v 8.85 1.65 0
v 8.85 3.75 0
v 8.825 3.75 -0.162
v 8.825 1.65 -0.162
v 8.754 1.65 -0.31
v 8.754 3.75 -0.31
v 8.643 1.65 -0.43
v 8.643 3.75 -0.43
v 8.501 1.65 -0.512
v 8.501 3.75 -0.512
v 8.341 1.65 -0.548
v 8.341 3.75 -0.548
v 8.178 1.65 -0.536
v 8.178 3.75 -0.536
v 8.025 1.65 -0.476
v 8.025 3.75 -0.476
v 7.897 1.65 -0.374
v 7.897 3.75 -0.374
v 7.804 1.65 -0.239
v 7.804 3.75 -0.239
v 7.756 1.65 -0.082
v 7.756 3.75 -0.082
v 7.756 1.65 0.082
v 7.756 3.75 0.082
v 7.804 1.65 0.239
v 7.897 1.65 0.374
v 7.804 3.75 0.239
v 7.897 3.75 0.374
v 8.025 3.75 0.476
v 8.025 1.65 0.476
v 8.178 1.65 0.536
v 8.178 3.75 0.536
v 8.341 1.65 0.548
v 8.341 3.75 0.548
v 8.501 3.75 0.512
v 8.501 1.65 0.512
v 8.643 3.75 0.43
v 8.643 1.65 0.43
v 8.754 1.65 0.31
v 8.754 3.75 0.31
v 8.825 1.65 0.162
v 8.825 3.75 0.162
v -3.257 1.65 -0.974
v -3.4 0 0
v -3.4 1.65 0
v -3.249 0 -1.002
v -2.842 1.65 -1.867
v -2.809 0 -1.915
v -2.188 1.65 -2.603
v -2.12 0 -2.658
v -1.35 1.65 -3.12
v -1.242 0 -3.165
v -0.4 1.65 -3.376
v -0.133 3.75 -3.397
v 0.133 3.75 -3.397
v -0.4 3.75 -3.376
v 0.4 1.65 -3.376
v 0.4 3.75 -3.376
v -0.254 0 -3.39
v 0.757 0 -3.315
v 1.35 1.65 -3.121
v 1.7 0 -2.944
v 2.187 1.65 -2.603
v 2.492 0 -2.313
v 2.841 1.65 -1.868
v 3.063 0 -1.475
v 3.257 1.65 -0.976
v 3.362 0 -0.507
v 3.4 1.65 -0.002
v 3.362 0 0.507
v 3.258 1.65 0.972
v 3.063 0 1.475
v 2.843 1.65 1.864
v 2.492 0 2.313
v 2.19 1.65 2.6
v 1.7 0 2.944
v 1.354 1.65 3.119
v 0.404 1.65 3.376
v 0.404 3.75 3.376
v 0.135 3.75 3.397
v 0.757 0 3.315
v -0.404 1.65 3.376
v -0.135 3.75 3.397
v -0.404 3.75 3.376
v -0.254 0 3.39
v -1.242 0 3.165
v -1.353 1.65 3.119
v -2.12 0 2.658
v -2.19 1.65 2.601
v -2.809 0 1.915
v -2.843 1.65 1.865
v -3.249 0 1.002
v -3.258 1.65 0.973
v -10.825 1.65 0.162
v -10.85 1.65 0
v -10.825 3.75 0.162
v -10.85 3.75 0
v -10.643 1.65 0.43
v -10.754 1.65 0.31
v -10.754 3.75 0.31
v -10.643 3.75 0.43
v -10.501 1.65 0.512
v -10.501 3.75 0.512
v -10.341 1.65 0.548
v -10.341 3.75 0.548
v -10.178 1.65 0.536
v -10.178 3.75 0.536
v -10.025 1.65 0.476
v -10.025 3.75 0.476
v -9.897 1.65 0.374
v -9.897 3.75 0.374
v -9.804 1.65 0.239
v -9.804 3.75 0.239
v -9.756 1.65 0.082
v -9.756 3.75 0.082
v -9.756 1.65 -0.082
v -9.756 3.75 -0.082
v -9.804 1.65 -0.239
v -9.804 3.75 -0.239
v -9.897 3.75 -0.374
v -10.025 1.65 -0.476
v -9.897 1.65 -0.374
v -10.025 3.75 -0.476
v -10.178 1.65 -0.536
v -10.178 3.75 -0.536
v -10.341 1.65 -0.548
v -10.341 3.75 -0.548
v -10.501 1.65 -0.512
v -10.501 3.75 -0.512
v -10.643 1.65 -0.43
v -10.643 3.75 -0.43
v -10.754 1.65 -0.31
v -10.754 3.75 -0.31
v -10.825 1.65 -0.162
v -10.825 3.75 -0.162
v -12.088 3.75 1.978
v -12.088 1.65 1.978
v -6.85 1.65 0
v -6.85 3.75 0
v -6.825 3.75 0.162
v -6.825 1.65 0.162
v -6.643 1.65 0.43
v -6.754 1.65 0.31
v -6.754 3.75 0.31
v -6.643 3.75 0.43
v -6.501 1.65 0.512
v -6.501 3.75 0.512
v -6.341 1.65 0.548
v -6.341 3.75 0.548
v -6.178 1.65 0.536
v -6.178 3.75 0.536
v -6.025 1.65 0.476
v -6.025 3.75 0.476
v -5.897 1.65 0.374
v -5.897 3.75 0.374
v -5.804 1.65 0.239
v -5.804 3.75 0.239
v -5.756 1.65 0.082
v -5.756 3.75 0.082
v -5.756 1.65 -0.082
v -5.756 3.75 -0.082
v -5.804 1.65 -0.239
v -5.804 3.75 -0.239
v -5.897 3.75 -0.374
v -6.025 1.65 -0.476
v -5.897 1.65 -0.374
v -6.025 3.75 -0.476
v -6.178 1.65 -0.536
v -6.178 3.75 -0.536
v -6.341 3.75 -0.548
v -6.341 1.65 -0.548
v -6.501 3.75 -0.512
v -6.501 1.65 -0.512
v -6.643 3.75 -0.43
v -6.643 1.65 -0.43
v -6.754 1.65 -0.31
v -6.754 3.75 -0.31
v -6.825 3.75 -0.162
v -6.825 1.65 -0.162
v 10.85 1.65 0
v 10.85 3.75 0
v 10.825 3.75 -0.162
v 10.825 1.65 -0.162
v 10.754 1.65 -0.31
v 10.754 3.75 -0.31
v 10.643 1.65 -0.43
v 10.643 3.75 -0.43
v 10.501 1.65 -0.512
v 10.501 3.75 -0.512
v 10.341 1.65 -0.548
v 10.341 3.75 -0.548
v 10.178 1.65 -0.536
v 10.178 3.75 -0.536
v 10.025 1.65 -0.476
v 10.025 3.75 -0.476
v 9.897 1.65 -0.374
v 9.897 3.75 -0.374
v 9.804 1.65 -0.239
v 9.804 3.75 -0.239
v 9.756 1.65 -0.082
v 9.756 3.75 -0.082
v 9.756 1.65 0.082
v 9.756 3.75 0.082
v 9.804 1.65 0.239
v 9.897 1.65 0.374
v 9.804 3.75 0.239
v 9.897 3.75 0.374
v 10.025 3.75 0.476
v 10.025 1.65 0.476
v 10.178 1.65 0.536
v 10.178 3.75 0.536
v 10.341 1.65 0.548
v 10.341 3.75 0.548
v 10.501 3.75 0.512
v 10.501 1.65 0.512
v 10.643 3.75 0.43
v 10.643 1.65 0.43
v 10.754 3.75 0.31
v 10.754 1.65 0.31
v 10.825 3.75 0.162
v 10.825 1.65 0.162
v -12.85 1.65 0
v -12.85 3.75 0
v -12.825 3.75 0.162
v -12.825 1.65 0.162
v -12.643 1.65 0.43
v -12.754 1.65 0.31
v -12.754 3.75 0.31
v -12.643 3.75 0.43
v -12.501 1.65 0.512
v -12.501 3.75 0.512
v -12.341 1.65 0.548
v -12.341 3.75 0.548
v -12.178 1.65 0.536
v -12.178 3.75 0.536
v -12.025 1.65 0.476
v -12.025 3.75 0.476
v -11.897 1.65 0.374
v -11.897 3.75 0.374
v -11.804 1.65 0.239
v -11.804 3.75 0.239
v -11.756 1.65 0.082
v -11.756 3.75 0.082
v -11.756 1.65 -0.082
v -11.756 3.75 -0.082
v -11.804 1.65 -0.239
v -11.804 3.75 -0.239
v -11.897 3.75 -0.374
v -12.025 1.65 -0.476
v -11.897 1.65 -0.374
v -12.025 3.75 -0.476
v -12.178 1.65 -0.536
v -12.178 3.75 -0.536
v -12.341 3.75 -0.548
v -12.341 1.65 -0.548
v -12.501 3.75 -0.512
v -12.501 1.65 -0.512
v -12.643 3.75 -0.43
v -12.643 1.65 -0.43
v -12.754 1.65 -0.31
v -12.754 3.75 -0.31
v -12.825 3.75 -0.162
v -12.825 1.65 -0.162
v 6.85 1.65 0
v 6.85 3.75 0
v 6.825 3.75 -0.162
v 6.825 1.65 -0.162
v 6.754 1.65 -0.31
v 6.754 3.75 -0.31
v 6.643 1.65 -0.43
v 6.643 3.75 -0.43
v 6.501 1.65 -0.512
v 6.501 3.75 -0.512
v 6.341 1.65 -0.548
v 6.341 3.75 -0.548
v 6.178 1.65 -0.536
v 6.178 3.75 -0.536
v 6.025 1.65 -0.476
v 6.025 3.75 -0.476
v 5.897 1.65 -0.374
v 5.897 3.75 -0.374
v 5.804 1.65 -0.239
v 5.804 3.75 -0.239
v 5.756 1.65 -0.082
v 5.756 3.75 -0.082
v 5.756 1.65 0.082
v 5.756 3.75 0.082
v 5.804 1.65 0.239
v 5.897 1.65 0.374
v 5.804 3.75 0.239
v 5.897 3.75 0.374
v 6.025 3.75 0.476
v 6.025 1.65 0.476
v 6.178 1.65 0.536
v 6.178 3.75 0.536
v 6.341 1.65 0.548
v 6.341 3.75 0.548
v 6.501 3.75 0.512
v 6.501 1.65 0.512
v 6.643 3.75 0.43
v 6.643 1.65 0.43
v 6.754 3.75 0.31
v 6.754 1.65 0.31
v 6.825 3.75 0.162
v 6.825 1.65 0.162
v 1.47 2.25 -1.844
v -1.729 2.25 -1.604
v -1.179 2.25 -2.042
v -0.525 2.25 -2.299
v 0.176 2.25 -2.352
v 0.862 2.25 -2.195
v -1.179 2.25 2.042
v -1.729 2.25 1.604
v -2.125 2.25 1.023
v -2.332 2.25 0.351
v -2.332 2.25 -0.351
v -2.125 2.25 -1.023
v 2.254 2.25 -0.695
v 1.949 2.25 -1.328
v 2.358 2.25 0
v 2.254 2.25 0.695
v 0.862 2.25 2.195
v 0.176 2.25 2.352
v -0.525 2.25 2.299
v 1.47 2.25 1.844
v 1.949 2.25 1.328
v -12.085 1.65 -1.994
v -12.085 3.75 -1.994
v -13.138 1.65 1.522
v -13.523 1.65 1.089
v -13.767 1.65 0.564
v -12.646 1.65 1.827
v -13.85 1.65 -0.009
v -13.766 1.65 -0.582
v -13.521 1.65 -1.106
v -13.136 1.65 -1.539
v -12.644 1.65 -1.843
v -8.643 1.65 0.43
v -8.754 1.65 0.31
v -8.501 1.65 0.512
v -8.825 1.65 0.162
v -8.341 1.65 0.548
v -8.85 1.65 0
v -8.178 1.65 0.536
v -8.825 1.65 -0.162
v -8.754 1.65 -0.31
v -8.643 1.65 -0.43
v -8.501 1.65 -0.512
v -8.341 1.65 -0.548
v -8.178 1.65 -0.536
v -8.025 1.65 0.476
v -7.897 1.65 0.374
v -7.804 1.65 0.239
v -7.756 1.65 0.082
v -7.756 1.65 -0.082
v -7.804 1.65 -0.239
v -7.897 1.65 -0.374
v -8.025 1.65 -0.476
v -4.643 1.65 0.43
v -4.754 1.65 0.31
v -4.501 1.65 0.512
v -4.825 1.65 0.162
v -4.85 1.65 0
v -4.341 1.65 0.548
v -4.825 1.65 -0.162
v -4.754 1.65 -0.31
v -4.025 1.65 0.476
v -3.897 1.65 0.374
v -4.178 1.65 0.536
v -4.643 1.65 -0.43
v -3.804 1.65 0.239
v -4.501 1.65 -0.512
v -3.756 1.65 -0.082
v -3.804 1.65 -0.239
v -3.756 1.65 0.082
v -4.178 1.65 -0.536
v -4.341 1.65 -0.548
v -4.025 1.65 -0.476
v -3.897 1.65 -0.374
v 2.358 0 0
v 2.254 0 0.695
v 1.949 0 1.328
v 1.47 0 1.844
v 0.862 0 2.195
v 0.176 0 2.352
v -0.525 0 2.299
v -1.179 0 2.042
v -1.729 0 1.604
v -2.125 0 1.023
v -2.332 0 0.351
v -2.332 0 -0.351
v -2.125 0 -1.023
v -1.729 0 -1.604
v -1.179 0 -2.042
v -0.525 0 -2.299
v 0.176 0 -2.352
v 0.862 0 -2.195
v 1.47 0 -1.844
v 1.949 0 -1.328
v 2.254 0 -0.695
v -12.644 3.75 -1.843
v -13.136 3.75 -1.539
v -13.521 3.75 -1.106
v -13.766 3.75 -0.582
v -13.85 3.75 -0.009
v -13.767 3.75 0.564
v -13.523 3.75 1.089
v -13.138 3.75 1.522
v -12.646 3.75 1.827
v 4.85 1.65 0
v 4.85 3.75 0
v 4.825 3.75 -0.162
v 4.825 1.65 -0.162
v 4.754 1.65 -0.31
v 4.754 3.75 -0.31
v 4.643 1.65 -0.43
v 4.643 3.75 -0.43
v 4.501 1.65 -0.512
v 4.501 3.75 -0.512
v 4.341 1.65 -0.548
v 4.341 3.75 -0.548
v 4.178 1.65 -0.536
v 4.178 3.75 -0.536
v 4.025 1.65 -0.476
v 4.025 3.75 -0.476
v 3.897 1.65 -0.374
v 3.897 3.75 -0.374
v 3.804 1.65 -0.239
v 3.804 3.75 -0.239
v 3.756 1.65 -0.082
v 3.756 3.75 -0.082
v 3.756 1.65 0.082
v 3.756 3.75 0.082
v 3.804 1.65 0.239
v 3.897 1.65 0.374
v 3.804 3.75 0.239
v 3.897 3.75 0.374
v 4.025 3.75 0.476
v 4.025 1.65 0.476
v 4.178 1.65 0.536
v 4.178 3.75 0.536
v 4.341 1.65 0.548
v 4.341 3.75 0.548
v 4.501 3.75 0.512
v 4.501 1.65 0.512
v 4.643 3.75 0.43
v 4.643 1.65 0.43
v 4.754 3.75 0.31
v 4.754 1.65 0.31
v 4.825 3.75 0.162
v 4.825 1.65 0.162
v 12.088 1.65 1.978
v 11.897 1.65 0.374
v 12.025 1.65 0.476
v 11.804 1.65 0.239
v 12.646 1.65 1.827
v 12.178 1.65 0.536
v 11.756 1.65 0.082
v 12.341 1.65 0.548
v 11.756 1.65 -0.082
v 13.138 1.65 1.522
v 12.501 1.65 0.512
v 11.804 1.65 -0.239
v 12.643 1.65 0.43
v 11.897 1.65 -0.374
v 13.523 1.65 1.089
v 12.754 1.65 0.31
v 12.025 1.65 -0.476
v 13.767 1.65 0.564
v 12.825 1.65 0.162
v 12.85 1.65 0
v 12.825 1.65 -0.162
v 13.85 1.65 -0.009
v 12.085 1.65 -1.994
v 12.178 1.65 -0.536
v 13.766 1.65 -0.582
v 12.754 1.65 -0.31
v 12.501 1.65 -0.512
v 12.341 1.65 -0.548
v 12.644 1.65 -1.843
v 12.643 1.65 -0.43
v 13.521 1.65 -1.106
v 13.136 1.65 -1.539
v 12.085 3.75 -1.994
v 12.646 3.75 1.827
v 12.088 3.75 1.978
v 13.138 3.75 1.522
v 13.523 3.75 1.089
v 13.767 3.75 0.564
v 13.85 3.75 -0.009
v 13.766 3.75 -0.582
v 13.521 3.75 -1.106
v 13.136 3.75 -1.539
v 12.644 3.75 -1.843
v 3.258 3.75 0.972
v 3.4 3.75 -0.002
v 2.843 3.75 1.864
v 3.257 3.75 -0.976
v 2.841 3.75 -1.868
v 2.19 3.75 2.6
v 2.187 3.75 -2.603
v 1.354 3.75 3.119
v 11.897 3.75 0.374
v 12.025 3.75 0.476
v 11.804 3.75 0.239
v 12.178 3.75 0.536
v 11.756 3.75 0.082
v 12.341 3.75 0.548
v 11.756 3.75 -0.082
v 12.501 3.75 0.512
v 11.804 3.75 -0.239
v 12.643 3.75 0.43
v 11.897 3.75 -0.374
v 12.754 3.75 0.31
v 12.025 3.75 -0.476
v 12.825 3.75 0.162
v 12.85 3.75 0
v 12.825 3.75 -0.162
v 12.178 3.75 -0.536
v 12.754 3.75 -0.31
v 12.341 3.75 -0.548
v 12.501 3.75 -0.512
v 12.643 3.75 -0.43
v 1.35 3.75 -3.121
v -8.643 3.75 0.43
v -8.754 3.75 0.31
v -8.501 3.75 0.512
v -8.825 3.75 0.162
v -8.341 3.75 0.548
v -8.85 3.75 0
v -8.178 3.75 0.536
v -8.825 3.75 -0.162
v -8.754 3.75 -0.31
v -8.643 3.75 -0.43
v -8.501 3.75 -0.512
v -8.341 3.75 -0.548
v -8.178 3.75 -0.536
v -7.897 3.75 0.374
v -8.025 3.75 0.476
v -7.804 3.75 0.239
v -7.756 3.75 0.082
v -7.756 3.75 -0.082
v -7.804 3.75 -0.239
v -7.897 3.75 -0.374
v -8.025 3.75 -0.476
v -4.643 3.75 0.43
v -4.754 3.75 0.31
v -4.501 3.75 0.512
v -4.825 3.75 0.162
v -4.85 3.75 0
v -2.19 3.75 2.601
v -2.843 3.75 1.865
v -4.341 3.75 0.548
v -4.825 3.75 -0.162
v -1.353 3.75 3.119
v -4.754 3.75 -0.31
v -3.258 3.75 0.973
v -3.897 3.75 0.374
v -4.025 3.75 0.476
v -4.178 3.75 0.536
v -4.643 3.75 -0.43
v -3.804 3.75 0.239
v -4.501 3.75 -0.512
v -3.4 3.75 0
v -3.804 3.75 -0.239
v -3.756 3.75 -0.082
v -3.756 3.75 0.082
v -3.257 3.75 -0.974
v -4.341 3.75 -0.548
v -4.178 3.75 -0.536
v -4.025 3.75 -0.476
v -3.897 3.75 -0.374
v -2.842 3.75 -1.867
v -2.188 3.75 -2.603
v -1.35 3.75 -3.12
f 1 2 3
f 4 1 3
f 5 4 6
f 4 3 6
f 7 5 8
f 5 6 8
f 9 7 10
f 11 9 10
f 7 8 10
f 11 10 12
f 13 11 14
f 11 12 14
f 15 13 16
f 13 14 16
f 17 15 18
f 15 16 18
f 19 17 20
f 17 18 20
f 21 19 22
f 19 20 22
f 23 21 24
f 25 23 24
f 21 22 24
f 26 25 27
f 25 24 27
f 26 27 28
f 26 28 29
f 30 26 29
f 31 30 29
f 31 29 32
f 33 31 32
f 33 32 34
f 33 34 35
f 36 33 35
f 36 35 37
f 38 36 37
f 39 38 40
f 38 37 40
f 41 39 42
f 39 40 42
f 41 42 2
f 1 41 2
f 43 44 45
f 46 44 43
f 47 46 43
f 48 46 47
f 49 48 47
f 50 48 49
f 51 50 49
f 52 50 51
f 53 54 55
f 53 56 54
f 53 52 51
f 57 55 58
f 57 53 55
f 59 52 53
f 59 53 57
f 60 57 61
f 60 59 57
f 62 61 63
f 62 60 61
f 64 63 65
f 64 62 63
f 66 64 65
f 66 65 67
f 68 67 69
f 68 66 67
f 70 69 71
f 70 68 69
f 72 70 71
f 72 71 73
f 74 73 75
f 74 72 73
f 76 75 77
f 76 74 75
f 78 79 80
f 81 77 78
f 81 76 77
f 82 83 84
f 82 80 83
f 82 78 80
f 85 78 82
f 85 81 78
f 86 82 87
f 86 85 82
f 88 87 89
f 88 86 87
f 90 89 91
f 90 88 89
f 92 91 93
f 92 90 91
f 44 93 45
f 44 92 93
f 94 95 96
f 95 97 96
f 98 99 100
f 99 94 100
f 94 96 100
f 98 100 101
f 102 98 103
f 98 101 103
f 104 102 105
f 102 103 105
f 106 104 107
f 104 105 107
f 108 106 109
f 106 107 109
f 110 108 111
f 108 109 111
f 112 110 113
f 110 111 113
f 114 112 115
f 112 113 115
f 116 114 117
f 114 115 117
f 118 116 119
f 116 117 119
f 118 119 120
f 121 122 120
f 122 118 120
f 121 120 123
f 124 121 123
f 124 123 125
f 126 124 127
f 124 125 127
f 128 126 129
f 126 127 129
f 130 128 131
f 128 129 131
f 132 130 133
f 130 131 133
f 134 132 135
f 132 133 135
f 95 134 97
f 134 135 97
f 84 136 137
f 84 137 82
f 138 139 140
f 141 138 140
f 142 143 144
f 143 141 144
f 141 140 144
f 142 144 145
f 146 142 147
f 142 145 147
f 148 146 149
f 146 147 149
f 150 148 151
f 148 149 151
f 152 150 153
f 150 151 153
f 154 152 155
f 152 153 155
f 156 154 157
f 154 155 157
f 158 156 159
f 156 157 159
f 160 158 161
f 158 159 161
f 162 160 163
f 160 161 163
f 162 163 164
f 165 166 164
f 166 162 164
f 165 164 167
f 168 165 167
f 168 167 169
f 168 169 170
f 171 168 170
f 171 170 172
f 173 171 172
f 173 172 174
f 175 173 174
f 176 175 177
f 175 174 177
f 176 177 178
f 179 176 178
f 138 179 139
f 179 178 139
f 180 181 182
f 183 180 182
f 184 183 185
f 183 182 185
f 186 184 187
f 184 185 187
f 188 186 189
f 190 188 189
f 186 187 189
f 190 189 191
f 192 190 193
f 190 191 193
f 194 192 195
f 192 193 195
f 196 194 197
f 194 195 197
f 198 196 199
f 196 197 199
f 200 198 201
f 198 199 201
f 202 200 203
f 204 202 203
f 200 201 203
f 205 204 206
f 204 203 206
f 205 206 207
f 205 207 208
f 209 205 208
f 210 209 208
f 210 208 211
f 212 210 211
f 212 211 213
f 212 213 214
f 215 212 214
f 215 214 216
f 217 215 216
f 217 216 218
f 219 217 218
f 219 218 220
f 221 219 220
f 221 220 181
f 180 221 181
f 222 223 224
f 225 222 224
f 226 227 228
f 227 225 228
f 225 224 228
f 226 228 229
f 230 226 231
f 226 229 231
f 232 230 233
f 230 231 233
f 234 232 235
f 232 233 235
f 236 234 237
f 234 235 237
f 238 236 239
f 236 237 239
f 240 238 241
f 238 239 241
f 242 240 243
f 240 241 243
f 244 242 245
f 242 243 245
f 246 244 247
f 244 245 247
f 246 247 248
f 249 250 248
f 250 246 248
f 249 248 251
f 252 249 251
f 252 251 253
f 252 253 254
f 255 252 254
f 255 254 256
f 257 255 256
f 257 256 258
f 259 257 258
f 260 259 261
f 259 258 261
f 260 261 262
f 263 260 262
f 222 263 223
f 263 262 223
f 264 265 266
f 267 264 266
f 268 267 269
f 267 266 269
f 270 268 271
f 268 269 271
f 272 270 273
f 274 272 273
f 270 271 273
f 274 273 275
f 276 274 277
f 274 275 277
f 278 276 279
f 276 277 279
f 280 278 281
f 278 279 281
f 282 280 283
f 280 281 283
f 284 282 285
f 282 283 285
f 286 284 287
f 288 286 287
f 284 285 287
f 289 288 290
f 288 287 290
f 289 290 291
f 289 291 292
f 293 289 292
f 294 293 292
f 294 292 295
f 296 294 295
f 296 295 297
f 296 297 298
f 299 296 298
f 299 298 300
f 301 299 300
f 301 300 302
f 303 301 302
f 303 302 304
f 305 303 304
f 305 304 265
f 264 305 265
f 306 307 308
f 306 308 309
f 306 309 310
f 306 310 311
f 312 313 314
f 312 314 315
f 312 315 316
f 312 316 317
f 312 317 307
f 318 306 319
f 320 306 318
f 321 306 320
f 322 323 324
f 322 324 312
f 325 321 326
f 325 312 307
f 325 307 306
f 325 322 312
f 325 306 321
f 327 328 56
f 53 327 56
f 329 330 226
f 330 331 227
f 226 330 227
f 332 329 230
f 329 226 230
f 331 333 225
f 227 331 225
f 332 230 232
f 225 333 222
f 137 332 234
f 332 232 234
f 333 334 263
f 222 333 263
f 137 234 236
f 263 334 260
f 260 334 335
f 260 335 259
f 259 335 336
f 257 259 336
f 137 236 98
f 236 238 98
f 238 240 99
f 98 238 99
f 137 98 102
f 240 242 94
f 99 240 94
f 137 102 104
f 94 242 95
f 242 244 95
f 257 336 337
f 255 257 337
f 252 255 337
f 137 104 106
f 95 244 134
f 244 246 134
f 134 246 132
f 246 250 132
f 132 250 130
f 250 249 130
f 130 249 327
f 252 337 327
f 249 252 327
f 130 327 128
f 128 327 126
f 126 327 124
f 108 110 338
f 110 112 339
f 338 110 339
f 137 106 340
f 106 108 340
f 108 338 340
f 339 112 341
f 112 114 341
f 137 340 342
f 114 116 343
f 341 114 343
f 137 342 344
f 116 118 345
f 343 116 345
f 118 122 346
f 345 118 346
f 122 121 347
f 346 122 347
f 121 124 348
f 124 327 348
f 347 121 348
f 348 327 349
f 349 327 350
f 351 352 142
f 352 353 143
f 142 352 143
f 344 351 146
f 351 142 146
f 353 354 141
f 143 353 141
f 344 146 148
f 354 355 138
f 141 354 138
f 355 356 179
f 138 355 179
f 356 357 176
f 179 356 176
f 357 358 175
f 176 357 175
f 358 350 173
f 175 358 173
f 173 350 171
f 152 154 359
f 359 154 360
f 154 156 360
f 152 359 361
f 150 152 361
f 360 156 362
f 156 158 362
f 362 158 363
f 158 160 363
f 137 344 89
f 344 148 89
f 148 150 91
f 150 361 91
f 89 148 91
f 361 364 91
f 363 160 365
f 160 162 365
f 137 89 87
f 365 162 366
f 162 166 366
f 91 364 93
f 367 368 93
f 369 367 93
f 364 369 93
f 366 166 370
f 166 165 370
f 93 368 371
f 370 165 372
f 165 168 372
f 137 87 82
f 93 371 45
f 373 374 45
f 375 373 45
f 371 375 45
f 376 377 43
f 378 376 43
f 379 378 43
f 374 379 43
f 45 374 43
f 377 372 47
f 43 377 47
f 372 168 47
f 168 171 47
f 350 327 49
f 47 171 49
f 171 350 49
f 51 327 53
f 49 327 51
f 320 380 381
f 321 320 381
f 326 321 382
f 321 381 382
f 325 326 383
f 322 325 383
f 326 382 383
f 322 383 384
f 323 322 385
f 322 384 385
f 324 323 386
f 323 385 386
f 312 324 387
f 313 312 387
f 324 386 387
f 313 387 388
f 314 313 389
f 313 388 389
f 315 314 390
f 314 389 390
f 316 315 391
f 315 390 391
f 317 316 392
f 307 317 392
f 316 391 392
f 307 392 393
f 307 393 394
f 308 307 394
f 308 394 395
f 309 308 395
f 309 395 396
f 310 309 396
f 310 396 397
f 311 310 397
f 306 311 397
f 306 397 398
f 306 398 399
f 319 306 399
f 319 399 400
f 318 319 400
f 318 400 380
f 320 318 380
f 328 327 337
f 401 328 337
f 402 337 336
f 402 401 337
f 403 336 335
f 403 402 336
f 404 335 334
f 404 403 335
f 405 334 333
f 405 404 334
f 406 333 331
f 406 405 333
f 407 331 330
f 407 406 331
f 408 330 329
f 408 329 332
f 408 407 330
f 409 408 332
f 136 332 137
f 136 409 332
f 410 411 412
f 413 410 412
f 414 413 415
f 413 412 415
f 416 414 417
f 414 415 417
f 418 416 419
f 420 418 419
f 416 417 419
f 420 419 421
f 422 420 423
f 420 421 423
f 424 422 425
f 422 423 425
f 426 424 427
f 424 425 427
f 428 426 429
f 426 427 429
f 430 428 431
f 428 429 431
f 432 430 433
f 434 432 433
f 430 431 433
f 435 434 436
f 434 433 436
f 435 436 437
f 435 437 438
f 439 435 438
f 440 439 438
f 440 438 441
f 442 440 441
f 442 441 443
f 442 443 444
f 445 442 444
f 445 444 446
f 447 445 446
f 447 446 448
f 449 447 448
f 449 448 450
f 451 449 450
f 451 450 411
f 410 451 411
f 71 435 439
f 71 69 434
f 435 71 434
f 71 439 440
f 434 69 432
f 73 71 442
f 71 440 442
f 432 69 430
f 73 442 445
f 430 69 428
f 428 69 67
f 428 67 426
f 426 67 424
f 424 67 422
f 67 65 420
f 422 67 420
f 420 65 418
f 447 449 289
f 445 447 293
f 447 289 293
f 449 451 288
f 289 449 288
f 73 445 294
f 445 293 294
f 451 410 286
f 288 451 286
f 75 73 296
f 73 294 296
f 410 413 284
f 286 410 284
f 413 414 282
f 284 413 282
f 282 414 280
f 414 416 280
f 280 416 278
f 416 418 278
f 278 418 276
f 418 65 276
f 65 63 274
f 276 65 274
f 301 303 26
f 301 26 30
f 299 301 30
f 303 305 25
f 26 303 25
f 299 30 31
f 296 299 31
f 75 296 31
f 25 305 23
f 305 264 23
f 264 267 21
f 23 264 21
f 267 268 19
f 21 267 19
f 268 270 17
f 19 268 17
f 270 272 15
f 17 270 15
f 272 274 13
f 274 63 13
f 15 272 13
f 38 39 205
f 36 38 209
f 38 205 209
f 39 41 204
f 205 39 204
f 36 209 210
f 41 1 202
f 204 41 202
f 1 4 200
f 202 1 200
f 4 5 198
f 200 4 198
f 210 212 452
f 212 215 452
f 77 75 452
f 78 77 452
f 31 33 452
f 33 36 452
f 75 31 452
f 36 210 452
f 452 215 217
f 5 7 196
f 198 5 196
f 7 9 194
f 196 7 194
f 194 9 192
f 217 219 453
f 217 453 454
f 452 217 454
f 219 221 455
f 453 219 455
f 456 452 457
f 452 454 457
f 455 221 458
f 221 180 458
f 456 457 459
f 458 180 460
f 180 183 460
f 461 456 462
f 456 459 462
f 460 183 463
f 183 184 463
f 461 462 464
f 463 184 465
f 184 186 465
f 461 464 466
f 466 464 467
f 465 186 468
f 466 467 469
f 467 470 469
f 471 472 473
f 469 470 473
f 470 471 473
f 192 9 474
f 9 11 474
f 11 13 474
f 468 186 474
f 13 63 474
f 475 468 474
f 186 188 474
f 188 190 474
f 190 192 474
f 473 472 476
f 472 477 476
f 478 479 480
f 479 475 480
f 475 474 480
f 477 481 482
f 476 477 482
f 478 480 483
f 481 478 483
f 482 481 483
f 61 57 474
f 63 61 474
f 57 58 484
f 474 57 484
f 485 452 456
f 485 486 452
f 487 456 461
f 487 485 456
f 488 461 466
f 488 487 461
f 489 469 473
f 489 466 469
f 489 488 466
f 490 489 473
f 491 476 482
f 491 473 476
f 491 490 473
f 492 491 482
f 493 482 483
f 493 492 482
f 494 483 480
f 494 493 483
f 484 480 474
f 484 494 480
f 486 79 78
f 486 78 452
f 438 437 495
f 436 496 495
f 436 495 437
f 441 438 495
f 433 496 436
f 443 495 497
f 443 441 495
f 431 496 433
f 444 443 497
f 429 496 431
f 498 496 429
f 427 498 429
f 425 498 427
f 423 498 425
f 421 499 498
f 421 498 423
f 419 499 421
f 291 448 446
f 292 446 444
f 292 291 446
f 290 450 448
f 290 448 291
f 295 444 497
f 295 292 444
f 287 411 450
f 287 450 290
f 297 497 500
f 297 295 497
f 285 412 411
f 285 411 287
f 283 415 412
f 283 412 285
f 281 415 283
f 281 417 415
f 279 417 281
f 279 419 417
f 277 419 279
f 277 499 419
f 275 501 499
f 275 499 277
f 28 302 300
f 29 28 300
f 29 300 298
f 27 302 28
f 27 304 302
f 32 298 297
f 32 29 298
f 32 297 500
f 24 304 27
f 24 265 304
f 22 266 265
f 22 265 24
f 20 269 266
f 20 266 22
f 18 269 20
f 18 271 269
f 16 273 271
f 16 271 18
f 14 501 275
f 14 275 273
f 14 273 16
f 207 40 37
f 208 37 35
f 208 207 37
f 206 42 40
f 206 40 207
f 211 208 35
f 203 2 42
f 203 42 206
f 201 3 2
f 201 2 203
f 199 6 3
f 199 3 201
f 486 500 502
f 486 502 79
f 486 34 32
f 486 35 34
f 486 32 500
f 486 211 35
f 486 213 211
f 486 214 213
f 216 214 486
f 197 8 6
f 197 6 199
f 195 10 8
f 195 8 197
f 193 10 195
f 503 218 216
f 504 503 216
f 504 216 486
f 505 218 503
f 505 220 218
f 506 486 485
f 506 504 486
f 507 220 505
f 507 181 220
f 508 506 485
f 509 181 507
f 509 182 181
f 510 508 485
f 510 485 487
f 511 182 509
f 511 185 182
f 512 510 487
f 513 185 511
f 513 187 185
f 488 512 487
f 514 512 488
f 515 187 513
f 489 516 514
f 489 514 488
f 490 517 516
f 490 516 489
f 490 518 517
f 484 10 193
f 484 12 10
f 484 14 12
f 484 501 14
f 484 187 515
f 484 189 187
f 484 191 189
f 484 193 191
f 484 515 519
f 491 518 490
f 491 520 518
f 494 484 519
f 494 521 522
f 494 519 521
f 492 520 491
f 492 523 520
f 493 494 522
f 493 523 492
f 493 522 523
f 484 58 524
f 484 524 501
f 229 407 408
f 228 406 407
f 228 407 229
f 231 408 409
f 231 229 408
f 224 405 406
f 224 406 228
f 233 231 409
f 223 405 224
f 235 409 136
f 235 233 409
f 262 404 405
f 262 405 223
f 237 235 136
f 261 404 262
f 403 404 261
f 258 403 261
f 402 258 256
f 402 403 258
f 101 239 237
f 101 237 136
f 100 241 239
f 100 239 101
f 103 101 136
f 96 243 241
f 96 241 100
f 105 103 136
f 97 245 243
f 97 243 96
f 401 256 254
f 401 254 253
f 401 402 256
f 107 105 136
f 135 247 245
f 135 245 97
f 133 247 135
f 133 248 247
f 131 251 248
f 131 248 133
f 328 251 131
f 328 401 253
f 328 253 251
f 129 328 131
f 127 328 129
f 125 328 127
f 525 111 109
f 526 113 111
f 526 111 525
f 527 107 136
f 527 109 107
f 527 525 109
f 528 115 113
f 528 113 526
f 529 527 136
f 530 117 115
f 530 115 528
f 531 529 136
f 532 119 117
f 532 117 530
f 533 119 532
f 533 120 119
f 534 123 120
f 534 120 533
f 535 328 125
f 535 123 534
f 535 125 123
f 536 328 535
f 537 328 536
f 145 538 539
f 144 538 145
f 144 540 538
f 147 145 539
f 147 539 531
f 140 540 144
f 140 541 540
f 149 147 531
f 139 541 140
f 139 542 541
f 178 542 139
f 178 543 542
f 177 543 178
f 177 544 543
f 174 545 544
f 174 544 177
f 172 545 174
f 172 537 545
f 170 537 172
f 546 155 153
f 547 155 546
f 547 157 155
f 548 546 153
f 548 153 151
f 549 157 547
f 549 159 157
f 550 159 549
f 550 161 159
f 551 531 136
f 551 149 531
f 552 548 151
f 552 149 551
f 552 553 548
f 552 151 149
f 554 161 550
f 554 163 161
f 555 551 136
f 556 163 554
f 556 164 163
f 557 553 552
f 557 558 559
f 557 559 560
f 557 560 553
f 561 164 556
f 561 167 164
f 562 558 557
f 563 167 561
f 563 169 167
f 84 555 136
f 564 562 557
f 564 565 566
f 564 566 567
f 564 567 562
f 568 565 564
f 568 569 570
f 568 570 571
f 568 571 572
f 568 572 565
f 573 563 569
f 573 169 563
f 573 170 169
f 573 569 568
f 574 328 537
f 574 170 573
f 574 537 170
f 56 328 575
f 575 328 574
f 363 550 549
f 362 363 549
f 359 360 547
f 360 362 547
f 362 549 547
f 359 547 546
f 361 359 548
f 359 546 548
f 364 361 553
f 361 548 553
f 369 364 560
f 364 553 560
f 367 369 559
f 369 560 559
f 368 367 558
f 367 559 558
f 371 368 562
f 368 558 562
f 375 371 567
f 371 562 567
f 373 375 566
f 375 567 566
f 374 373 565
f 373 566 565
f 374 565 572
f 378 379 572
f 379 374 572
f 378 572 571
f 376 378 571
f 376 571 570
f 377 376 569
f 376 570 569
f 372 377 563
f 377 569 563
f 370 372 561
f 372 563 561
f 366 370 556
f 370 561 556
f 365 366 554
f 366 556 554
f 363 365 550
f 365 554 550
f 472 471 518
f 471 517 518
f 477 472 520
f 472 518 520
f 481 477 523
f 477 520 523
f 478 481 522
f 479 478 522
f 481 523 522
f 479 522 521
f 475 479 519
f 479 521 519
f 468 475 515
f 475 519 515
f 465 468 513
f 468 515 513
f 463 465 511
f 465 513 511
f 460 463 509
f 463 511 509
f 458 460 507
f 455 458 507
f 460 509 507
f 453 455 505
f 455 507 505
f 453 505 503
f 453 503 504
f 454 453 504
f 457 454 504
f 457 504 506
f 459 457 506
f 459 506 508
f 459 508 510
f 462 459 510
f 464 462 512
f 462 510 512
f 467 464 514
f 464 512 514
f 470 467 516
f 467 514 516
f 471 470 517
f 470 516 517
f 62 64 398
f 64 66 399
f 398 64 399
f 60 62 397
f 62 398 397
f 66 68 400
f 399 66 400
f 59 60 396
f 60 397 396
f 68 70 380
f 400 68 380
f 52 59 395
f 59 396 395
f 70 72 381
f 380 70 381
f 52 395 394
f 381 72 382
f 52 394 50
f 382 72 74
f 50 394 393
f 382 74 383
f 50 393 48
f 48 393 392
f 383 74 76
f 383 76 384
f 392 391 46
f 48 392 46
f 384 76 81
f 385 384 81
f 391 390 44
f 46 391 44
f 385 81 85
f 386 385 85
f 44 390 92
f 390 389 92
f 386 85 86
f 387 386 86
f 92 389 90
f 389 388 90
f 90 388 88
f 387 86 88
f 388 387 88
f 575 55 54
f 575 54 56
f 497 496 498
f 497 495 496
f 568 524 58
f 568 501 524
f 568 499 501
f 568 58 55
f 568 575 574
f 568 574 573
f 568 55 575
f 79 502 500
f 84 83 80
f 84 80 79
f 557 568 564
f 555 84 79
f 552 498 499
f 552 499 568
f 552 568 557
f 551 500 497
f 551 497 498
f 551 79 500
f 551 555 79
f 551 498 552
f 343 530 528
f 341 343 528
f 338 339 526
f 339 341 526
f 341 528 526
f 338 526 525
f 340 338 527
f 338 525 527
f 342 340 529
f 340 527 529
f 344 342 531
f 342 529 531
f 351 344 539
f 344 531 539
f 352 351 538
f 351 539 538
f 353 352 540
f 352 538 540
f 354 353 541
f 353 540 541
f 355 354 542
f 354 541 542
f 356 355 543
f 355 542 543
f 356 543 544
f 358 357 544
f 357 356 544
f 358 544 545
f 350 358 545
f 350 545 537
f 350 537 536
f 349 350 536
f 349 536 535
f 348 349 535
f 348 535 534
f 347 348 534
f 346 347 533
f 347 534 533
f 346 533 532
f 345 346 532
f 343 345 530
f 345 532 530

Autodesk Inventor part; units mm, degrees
ref_plane "YZ Plane" through (0, 0, 0) normal (1, 0, 0) x (0, 1, 0)
ref_plane "XZ Plane" through (0, 0, 0) normal (0, 1, 0) x (-1, 0, 0)
ref_plane "XY Plane" through (0, 0, 0) normal (0, 0, 1) x (1, 0, 0)
sketch "Sketch1" plane through (0, 0, 0) normal (0, 1, 0) x (-1, 0, 0)
  circle A0 centre (0, 0) radius 3.4
  dimension "d3" = 6.8
extrude "Extrusion1" add sketch "Sketch1" along normal blind 3.75
sketch "Sketch2" plane through (0, 0, 0) normal (0, -1, 0) x (1, 0, 0)
  circle A0 centre (0, 0) radius 2.3583
extrude "Extrusion2" cut sketch "Sketch2" against normal blind 2.25
sketch "Sketch3" plane through (0, 3.75, 0) normal (0, 1, 0) x (1, 0, 0)
  circle A0 centre (0, 0) radius 3.4 construction
  line L0 (0, -3.4) -> (0, 3.4) construction
  circle A1 centre (-11.85, 0.0077) radius 2
  line L1 (-12.0876, -1.9781) -> (-0.4039, -3.3759)
  line L2 (-12.085, 1.9939) -> (-0.3995, 3.3764)
  circle A2 centre (0, 0) radius 3.4 projected
  dimension "d6" = 4
  dimension "d7" = 11.85
extrude "Extrusion3" add sketch "Sketch3" against normal blind 2.1 contours A1 | A1 L2 A2 L1
mirror "Mirror1" about plane through (0, 0, 0) normal (1, 0, 0) of "Extrusion3"
sketch "Sketch4" plane through (0, 3.75, 0) normal (0, 1, 0) x (1, 0, 0)
  circle A0 centre (12.2999, 0) radius 0.55
  arc A1 (12.0876, -1.9781) -> (12.085, 1.9939) centre (11.85, 0.0077) ccw projected
  line L0 (0, 0) -> (13.85, 0) construction
  circle A2 centre (10.2999, 0) radius 0.55
  circle A3 centre (8.2999, 0) radius 0.55
  circle A4 centre (6.2999, 0) radius 0.55
  circle A5 centre (4.2999, 0) radius 0.55
  dimension "d10" = 1.1
  dimension "d11" = 1
  dimension "d14" = 2
extrude "Extrusion4" cut sketch "Sketch4" against normal blind 2.1
mirror "Mirror2" about plane through (0, 0, 0) normal (1, 0, 0) of "Extrusion4"
properties part number "stick"
